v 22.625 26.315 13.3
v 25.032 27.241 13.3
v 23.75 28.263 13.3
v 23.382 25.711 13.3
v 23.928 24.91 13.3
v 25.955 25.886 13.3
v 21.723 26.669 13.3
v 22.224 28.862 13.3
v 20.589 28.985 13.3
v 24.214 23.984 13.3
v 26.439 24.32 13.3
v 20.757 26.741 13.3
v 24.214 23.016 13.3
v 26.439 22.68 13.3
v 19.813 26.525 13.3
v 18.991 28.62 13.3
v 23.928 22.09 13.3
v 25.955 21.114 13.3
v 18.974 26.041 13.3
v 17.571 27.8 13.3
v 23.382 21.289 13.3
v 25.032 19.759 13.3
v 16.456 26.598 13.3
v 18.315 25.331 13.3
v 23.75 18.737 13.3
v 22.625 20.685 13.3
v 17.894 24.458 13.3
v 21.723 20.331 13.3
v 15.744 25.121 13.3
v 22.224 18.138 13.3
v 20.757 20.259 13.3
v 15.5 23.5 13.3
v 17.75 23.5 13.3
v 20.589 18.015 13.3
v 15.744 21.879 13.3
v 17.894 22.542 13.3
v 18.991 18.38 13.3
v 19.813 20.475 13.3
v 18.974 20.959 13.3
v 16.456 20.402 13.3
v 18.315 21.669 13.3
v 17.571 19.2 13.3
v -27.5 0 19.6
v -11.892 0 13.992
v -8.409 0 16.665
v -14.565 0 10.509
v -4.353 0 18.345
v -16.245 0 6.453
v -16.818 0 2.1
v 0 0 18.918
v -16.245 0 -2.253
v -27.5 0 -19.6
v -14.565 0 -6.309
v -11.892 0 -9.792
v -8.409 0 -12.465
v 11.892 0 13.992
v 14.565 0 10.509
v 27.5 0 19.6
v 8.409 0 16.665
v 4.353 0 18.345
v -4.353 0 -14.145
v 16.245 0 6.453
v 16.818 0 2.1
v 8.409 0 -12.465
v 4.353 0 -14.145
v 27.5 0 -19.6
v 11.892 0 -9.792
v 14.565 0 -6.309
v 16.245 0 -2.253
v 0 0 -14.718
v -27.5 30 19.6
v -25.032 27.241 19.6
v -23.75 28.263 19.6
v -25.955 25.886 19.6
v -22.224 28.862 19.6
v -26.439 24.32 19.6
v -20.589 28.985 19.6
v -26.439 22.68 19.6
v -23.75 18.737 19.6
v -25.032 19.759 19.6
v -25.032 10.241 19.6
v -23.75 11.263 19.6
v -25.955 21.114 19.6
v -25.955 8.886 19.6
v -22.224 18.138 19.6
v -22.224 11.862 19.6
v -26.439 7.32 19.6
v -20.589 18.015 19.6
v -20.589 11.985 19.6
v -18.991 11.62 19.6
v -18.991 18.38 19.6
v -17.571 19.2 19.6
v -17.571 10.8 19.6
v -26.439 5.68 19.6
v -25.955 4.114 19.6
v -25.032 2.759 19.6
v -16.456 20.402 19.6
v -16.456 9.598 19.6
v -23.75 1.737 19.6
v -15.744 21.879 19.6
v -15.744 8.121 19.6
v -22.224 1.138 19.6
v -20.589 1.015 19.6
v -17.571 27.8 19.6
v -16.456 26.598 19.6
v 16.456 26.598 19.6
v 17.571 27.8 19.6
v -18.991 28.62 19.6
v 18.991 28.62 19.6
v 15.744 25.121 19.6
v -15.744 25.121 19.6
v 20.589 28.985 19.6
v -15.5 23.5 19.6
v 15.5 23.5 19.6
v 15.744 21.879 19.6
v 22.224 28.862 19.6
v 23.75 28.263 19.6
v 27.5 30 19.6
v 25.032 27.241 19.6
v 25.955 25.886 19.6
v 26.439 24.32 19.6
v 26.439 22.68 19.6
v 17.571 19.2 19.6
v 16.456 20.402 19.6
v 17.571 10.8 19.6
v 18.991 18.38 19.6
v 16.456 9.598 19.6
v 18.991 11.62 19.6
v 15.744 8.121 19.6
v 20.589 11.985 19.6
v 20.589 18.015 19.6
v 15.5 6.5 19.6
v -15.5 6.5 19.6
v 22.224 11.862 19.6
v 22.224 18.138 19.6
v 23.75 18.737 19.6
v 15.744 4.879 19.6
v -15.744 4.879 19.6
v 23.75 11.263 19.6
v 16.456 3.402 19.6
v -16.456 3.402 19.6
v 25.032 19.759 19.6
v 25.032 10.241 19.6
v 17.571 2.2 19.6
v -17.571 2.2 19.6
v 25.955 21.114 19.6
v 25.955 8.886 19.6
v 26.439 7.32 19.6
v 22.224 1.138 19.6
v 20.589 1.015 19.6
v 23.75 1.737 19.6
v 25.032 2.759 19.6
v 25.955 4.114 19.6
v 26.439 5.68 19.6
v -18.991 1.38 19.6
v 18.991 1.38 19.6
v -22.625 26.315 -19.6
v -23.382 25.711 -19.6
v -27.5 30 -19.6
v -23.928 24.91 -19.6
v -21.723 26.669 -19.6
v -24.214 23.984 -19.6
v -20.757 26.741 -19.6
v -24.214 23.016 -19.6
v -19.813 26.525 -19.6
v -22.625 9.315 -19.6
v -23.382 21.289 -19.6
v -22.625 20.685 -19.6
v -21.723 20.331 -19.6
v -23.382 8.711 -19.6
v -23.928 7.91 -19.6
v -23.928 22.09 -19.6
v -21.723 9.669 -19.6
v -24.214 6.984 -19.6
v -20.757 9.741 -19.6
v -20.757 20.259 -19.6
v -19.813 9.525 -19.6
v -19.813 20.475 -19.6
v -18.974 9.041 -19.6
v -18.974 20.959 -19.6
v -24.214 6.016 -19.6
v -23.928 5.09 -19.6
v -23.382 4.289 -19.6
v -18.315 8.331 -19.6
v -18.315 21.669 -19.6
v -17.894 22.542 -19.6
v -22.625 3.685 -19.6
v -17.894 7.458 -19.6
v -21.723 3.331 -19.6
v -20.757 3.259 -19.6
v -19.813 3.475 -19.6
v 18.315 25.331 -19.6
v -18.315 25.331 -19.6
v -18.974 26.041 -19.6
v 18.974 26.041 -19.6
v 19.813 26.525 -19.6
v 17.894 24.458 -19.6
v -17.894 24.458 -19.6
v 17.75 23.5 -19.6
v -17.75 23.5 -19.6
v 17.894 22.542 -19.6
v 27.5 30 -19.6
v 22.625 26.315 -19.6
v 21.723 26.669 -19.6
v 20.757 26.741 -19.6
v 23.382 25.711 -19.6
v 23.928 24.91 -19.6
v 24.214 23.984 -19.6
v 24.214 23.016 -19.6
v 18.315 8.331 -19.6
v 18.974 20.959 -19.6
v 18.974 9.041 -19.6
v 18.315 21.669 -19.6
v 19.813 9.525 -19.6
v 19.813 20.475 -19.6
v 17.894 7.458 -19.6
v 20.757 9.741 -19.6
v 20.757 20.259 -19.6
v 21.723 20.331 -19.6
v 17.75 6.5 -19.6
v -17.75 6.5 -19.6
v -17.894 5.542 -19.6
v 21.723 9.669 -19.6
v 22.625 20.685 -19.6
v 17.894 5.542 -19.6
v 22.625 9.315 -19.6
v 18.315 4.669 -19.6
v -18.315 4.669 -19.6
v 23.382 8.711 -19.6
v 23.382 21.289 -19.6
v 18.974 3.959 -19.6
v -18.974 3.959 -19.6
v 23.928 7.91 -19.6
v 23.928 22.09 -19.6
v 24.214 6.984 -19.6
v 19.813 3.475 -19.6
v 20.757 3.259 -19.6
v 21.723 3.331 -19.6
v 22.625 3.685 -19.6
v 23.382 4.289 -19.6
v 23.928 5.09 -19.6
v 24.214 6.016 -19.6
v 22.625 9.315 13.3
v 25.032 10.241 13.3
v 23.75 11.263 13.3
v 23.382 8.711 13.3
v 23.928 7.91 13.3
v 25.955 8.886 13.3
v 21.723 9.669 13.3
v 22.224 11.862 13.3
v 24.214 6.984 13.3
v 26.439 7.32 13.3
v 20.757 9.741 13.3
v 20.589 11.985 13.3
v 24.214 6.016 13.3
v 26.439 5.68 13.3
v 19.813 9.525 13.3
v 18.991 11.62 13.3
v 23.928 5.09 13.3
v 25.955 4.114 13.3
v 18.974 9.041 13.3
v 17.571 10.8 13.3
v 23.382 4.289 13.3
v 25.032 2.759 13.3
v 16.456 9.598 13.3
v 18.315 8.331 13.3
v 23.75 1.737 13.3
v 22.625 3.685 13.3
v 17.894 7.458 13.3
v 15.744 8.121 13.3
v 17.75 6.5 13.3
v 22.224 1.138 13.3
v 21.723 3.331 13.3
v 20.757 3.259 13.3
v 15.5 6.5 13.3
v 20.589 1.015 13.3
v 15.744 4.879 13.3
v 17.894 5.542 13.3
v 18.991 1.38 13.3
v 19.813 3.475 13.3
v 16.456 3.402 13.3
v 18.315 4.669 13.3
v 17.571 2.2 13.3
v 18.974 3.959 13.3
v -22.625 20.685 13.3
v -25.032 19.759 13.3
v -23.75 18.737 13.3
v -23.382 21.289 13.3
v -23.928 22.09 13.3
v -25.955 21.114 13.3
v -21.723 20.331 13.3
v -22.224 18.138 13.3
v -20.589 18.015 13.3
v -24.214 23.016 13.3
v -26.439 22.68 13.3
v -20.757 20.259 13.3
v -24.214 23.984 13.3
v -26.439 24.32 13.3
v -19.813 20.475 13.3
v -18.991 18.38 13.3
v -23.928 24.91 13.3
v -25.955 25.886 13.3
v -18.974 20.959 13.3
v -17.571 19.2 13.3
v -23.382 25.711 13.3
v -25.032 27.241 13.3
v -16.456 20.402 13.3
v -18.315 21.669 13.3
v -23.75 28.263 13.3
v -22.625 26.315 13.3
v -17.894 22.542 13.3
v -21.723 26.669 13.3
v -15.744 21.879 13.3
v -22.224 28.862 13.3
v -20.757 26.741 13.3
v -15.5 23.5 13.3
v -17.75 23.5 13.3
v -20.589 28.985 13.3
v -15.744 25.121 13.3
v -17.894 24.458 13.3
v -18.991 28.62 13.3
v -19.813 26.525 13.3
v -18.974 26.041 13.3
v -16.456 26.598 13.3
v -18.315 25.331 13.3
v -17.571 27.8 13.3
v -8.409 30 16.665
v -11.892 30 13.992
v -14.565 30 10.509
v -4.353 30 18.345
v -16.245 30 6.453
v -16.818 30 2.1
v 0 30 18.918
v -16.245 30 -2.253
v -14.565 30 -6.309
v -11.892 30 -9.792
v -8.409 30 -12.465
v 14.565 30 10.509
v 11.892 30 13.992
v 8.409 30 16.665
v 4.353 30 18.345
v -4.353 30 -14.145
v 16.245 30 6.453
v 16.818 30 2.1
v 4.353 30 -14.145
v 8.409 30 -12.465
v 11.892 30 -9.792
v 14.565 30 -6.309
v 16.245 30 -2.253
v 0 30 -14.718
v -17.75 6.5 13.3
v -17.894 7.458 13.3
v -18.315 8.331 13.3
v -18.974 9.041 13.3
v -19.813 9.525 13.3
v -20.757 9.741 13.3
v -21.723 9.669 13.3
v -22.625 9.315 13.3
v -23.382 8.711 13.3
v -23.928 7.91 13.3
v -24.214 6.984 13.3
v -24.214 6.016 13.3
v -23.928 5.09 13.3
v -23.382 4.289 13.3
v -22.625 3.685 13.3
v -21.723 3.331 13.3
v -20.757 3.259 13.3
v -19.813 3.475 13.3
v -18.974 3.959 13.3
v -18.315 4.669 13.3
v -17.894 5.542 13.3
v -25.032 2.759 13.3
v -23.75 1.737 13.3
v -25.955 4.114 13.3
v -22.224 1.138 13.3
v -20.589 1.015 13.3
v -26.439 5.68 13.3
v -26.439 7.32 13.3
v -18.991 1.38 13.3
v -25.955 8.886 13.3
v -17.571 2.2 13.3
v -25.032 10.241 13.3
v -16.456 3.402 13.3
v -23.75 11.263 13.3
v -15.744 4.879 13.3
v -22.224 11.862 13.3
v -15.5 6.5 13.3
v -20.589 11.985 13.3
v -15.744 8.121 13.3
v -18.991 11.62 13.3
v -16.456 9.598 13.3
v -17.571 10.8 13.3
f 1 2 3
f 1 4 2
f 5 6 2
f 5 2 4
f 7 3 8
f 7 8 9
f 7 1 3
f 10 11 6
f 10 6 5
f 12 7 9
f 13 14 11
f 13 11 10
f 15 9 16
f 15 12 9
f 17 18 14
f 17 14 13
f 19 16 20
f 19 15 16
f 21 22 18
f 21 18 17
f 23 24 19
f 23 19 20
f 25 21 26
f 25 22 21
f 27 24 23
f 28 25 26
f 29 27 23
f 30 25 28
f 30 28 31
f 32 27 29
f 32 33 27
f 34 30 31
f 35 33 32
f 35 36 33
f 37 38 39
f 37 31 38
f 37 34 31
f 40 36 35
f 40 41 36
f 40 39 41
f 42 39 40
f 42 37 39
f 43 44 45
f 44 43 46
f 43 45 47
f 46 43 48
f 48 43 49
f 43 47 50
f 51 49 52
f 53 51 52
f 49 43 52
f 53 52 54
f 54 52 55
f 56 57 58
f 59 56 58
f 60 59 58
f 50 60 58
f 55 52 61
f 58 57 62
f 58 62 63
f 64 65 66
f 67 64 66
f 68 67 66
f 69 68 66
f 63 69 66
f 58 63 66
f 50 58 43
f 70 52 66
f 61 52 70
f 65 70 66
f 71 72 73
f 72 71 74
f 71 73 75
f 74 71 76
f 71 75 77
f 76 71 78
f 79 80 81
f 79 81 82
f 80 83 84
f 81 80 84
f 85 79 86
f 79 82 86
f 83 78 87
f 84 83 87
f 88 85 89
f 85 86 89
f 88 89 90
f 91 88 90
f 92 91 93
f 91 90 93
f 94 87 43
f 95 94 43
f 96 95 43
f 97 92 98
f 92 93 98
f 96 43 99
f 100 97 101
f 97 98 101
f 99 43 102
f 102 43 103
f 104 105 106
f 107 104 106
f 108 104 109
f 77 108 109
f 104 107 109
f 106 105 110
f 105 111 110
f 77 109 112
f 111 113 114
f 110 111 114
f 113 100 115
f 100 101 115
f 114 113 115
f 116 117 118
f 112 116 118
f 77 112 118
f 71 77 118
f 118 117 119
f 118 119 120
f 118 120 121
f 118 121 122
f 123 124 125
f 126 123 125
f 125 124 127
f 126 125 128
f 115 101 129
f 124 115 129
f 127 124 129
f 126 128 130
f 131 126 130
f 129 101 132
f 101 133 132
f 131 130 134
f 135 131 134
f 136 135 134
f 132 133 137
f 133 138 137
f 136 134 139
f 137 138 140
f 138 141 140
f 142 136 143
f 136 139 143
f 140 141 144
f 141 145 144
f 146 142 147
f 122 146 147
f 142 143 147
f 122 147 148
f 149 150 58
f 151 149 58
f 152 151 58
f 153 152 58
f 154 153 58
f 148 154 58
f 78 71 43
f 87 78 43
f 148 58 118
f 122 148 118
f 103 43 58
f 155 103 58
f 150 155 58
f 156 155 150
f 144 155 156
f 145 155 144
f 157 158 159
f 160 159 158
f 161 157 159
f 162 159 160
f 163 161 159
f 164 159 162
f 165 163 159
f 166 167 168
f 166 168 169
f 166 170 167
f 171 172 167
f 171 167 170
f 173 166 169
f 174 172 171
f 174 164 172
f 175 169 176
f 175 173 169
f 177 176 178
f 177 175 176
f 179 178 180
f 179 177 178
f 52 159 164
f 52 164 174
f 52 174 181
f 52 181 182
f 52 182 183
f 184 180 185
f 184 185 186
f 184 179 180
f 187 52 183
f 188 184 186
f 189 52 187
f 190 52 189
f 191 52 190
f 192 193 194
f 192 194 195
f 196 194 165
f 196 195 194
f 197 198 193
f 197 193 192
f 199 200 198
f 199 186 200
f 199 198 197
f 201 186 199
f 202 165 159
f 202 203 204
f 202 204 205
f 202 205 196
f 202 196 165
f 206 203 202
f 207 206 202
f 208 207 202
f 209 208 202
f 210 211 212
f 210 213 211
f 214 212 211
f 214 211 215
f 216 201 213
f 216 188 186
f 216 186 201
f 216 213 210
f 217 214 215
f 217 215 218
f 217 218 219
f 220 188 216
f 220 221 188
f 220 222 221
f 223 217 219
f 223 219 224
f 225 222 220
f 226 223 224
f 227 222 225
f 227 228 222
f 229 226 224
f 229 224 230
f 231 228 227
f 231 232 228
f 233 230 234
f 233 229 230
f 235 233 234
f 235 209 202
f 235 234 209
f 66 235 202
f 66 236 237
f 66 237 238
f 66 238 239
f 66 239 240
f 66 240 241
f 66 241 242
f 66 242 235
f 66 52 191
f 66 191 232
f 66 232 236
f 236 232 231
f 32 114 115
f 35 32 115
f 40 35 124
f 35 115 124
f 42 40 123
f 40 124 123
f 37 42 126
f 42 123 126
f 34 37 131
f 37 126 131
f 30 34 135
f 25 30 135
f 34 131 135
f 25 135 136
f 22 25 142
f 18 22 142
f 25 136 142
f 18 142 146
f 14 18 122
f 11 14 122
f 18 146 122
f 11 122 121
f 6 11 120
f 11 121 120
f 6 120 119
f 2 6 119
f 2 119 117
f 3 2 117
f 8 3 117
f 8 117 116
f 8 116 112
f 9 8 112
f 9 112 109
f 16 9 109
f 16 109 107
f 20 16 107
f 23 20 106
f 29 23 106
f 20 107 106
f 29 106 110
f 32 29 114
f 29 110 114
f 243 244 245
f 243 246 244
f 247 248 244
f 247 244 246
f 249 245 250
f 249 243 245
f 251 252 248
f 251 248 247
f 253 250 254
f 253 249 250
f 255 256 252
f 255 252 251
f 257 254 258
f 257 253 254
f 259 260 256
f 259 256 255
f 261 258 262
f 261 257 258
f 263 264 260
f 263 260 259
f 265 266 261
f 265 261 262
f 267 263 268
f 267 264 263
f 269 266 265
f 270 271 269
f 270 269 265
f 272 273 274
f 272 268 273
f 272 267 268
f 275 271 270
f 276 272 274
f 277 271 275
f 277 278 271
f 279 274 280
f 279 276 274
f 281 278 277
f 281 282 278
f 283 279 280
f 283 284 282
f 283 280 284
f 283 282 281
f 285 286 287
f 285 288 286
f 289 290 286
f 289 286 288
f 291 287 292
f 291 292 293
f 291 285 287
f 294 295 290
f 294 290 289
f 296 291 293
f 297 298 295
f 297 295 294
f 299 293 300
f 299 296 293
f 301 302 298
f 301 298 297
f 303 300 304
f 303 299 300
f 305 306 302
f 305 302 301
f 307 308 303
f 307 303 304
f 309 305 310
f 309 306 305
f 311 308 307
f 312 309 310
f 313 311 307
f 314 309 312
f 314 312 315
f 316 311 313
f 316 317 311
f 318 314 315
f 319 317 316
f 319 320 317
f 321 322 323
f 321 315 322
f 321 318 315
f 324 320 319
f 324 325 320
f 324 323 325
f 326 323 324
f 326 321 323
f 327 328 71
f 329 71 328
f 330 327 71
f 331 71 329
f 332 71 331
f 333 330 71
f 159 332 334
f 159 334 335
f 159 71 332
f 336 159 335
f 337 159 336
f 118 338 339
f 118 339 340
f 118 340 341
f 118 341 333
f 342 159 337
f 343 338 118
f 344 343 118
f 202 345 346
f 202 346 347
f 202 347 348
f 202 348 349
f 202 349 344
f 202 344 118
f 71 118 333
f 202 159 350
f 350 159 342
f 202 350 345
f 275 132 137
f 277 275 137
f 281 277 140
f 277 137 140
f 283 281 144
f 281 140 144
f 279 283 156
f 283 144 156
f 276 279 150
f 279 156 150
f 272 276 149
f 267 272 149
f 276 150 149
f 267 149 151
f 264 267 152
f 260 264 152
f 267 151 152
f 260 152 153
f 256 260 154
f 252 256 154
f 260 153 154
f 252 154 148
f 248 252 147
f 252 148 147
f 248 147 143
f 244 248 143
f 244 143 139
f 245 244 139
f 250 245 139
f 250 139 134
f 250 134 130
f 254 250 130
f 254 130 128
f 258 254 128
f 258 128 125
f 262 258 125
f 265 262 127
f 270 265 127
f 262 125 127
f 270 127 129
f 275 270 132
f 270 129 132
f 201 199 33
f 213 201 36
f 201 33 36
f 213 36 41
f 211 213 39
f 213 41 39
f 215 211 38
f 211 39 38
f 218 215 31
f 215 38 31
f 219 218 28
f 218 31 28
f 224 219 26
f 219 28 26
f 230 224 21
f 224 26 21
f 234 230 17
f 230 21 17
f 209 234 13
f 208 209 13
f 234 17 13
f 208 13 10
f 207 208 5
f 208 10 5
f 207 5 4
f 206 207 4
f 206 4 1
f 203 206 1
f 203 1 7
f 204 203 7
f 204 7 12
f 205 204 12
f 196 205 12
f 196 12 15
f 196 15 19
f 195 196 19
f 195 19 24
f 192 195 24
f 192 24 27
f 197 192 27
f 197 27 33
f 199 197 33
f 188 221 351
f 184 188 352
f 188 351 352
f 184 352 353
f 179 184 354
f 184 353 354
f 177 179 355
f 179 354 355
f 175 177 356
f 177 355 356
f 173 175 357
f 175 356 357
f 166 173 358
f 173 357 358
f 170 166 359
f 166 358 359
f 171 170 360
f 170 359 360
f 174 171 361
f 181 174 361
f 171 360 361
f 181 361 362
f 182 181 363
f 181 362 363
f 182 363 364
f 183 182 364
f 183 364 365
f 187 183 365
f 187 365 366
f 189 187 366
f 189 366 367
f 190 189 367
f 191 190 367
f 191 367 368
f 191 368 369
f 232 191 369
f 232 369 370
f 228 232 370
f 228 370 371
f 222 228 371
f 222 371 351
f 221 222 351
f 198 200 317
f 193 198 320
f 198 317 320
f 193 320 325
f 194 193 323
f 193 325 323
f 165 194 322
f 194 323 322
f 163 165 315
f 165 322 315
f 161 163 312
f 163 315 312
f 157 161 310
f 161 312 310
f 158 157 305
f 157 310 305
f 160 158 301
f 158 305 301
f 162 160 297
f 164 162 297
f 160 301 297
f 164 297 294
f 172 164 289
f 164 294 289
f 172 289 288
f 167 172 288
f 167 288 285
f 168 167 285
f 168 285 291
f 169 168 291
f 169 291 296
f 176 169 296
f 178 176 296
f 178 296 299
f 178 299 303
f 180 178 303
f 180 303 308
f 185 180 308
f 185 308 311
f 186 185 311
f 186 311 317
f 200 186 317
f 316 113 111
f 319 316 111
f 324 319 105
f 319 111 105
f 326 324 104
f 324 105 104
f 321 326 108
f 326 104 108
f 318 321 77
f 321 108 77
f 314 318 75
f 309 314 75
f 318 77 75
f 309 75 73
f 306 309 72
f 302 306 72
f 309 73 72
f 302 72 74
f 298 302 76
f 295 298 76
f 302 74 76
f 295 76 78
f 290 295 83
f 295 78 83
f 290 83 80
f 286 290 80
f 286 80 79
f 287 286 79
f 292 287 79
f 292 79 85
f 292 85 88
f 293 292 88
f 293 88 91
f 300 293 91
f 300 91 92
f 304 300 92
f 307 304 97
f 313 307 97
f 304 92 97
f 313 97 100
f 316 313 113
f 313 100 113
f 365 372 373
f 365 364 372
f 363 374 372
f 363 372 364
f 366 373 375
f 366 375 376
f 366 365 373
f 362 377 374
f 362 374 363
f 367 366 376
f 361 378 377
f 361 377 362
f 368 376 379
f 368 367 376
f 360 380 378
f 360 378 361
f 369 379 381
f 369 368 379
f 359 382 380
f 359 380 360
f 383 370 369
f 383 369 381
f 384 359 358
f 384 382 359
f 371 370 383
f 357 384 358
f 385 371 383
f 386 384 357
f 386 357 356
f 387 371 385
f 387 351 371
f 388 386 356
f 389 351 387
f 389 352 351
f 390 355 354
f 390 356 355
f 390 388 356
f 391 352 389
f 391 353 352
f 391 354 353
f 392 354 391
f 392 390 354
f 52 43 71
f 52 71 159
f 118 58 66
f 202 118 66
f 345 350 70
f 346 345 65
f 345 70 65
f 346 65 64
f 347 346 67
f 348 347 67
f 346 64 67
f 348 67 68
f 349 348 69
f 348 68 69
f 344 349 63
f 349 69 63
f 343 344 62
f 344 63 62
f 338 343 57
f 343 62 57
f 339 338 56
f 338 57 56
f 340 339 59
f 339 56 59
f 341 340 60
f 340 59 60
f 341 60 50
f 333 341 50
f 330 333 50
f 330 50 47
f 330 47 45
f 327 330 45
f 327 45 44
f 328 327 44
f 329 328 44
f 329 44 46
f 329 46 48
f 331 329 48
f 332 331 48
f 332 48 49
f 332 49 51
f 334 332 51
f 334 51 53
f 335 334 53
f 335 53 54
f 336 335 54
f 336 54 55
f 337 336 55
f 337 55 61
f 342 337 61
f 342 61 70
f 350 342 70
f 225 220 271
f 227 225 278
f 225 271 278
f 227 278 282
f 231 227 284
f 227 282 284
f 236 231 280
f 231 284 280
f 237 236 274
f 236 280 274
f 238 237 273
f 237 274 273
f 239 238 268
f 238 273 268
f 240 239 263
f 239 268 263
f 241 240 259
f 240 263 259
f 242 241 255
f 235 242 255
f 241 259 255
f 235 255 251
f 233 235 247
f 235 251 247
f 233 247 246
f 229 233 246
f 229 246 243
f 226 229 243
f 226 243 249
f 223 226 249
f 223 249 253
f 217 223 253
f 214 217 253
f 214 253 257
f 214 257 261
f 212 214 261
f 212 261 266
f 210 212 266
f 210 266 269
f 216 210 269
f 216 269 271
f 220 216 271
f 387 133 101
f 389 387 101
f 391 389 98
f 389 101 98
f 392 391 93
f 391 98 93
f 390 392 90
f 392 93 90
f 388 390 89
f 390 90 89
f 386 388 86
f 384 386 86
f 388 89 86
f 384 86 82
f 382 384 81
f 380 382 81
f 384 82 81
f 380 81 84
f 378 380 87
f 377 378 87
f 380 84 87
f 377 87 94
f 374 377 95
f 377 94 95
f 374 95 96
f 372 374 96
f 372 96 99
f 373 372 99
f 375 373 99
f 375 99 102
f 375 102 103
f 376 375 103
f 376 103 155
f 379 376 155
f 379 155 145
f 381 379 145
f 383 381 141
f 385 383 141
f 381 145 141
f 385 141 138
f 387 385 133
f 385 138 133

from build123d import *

# Parameters (mm, degrees)
SKETCH1_W           = 55
SKETCH1_H           = 39.2
BOSS_EXTRUDE1_DEPTH = 30
SKETCH2_R           = 16.818308595
CUT_EXTRUDE1_DEPTH  = 46.170897711
SKETCH3_R           = 5.5
CUT_EXTRUDE2_DEPTH  = 6.3
SKETCH5_R           = 3.25
CUT_EXTRUDE3_DEPTH  = 57.505663433


with BuildPart() as part:
    # Sketch1 → Boss-Extrude1 (new body)
    with BuildSketch(Plane(origin=(0, 0, 0), x_dir=(1, 0, 0), z_dir=(0, 1, 0))):
        Rectangle(SKETCH1_W, SKETCH1_H)
    extrude(amount=BOSS_EXTRUDE1_DEPTH)

    # Sketch2 → Cut-Extrude1 (cut, through all)
    with BuildSketch(Plane.XZ):
        with Locations(Location((0, 2.1, 0), (0, 0, 270))):
            Circle(SKETCH2_R)
    extrude(amount=-CUT_EXTRUDE1_DEPTH, mode=Mode.SUBTRACT)

    # Sketch3 → Cut-Extrude2 (cut)
    with BuildSketch(Plane.XY.offset(19.6)):
        with Locations((-21, 23.5)):
            Circle(SKETCH3_R)
        with Locations((-21, 6.5)):
            Circle(SKETCH3_R)
        with Locations(Location((21, 6.5, 0), (0, 0, 180))):
            Circle(SKETCH3_R)
        with Locations(Location((21, 23.5, 0), (0, 0, 180))):
            Circle(SKETCH3_R)
    extrude(amount=-CUT_EXTRUDE2_DEPTH, mode=Mode.SUBTRACT)

    # Sketch5 → Cut-Extrude3 (cut, through all)
    with BuildSketch(Plane.XY.offset(19.6)):
        with Locations((-21, 6.5)):
            Circle(SKETCH5_R)
        with Locations((-21, 23.5)):
            Circle(SKETCH5_R)
        with Locations(Location((21, 23.5, 0), (0, 0, 180))):
            Circle(SKETCH5_R)
        with Locations(Location((21, 6.5, 0), (0, 0, 180))):
            Circle(SKETCH5_R)
    extrude(amount=-CUT_EXTRUDE3_DEPTH, mode=Mode.SUBTRACT)


solid = part.part
